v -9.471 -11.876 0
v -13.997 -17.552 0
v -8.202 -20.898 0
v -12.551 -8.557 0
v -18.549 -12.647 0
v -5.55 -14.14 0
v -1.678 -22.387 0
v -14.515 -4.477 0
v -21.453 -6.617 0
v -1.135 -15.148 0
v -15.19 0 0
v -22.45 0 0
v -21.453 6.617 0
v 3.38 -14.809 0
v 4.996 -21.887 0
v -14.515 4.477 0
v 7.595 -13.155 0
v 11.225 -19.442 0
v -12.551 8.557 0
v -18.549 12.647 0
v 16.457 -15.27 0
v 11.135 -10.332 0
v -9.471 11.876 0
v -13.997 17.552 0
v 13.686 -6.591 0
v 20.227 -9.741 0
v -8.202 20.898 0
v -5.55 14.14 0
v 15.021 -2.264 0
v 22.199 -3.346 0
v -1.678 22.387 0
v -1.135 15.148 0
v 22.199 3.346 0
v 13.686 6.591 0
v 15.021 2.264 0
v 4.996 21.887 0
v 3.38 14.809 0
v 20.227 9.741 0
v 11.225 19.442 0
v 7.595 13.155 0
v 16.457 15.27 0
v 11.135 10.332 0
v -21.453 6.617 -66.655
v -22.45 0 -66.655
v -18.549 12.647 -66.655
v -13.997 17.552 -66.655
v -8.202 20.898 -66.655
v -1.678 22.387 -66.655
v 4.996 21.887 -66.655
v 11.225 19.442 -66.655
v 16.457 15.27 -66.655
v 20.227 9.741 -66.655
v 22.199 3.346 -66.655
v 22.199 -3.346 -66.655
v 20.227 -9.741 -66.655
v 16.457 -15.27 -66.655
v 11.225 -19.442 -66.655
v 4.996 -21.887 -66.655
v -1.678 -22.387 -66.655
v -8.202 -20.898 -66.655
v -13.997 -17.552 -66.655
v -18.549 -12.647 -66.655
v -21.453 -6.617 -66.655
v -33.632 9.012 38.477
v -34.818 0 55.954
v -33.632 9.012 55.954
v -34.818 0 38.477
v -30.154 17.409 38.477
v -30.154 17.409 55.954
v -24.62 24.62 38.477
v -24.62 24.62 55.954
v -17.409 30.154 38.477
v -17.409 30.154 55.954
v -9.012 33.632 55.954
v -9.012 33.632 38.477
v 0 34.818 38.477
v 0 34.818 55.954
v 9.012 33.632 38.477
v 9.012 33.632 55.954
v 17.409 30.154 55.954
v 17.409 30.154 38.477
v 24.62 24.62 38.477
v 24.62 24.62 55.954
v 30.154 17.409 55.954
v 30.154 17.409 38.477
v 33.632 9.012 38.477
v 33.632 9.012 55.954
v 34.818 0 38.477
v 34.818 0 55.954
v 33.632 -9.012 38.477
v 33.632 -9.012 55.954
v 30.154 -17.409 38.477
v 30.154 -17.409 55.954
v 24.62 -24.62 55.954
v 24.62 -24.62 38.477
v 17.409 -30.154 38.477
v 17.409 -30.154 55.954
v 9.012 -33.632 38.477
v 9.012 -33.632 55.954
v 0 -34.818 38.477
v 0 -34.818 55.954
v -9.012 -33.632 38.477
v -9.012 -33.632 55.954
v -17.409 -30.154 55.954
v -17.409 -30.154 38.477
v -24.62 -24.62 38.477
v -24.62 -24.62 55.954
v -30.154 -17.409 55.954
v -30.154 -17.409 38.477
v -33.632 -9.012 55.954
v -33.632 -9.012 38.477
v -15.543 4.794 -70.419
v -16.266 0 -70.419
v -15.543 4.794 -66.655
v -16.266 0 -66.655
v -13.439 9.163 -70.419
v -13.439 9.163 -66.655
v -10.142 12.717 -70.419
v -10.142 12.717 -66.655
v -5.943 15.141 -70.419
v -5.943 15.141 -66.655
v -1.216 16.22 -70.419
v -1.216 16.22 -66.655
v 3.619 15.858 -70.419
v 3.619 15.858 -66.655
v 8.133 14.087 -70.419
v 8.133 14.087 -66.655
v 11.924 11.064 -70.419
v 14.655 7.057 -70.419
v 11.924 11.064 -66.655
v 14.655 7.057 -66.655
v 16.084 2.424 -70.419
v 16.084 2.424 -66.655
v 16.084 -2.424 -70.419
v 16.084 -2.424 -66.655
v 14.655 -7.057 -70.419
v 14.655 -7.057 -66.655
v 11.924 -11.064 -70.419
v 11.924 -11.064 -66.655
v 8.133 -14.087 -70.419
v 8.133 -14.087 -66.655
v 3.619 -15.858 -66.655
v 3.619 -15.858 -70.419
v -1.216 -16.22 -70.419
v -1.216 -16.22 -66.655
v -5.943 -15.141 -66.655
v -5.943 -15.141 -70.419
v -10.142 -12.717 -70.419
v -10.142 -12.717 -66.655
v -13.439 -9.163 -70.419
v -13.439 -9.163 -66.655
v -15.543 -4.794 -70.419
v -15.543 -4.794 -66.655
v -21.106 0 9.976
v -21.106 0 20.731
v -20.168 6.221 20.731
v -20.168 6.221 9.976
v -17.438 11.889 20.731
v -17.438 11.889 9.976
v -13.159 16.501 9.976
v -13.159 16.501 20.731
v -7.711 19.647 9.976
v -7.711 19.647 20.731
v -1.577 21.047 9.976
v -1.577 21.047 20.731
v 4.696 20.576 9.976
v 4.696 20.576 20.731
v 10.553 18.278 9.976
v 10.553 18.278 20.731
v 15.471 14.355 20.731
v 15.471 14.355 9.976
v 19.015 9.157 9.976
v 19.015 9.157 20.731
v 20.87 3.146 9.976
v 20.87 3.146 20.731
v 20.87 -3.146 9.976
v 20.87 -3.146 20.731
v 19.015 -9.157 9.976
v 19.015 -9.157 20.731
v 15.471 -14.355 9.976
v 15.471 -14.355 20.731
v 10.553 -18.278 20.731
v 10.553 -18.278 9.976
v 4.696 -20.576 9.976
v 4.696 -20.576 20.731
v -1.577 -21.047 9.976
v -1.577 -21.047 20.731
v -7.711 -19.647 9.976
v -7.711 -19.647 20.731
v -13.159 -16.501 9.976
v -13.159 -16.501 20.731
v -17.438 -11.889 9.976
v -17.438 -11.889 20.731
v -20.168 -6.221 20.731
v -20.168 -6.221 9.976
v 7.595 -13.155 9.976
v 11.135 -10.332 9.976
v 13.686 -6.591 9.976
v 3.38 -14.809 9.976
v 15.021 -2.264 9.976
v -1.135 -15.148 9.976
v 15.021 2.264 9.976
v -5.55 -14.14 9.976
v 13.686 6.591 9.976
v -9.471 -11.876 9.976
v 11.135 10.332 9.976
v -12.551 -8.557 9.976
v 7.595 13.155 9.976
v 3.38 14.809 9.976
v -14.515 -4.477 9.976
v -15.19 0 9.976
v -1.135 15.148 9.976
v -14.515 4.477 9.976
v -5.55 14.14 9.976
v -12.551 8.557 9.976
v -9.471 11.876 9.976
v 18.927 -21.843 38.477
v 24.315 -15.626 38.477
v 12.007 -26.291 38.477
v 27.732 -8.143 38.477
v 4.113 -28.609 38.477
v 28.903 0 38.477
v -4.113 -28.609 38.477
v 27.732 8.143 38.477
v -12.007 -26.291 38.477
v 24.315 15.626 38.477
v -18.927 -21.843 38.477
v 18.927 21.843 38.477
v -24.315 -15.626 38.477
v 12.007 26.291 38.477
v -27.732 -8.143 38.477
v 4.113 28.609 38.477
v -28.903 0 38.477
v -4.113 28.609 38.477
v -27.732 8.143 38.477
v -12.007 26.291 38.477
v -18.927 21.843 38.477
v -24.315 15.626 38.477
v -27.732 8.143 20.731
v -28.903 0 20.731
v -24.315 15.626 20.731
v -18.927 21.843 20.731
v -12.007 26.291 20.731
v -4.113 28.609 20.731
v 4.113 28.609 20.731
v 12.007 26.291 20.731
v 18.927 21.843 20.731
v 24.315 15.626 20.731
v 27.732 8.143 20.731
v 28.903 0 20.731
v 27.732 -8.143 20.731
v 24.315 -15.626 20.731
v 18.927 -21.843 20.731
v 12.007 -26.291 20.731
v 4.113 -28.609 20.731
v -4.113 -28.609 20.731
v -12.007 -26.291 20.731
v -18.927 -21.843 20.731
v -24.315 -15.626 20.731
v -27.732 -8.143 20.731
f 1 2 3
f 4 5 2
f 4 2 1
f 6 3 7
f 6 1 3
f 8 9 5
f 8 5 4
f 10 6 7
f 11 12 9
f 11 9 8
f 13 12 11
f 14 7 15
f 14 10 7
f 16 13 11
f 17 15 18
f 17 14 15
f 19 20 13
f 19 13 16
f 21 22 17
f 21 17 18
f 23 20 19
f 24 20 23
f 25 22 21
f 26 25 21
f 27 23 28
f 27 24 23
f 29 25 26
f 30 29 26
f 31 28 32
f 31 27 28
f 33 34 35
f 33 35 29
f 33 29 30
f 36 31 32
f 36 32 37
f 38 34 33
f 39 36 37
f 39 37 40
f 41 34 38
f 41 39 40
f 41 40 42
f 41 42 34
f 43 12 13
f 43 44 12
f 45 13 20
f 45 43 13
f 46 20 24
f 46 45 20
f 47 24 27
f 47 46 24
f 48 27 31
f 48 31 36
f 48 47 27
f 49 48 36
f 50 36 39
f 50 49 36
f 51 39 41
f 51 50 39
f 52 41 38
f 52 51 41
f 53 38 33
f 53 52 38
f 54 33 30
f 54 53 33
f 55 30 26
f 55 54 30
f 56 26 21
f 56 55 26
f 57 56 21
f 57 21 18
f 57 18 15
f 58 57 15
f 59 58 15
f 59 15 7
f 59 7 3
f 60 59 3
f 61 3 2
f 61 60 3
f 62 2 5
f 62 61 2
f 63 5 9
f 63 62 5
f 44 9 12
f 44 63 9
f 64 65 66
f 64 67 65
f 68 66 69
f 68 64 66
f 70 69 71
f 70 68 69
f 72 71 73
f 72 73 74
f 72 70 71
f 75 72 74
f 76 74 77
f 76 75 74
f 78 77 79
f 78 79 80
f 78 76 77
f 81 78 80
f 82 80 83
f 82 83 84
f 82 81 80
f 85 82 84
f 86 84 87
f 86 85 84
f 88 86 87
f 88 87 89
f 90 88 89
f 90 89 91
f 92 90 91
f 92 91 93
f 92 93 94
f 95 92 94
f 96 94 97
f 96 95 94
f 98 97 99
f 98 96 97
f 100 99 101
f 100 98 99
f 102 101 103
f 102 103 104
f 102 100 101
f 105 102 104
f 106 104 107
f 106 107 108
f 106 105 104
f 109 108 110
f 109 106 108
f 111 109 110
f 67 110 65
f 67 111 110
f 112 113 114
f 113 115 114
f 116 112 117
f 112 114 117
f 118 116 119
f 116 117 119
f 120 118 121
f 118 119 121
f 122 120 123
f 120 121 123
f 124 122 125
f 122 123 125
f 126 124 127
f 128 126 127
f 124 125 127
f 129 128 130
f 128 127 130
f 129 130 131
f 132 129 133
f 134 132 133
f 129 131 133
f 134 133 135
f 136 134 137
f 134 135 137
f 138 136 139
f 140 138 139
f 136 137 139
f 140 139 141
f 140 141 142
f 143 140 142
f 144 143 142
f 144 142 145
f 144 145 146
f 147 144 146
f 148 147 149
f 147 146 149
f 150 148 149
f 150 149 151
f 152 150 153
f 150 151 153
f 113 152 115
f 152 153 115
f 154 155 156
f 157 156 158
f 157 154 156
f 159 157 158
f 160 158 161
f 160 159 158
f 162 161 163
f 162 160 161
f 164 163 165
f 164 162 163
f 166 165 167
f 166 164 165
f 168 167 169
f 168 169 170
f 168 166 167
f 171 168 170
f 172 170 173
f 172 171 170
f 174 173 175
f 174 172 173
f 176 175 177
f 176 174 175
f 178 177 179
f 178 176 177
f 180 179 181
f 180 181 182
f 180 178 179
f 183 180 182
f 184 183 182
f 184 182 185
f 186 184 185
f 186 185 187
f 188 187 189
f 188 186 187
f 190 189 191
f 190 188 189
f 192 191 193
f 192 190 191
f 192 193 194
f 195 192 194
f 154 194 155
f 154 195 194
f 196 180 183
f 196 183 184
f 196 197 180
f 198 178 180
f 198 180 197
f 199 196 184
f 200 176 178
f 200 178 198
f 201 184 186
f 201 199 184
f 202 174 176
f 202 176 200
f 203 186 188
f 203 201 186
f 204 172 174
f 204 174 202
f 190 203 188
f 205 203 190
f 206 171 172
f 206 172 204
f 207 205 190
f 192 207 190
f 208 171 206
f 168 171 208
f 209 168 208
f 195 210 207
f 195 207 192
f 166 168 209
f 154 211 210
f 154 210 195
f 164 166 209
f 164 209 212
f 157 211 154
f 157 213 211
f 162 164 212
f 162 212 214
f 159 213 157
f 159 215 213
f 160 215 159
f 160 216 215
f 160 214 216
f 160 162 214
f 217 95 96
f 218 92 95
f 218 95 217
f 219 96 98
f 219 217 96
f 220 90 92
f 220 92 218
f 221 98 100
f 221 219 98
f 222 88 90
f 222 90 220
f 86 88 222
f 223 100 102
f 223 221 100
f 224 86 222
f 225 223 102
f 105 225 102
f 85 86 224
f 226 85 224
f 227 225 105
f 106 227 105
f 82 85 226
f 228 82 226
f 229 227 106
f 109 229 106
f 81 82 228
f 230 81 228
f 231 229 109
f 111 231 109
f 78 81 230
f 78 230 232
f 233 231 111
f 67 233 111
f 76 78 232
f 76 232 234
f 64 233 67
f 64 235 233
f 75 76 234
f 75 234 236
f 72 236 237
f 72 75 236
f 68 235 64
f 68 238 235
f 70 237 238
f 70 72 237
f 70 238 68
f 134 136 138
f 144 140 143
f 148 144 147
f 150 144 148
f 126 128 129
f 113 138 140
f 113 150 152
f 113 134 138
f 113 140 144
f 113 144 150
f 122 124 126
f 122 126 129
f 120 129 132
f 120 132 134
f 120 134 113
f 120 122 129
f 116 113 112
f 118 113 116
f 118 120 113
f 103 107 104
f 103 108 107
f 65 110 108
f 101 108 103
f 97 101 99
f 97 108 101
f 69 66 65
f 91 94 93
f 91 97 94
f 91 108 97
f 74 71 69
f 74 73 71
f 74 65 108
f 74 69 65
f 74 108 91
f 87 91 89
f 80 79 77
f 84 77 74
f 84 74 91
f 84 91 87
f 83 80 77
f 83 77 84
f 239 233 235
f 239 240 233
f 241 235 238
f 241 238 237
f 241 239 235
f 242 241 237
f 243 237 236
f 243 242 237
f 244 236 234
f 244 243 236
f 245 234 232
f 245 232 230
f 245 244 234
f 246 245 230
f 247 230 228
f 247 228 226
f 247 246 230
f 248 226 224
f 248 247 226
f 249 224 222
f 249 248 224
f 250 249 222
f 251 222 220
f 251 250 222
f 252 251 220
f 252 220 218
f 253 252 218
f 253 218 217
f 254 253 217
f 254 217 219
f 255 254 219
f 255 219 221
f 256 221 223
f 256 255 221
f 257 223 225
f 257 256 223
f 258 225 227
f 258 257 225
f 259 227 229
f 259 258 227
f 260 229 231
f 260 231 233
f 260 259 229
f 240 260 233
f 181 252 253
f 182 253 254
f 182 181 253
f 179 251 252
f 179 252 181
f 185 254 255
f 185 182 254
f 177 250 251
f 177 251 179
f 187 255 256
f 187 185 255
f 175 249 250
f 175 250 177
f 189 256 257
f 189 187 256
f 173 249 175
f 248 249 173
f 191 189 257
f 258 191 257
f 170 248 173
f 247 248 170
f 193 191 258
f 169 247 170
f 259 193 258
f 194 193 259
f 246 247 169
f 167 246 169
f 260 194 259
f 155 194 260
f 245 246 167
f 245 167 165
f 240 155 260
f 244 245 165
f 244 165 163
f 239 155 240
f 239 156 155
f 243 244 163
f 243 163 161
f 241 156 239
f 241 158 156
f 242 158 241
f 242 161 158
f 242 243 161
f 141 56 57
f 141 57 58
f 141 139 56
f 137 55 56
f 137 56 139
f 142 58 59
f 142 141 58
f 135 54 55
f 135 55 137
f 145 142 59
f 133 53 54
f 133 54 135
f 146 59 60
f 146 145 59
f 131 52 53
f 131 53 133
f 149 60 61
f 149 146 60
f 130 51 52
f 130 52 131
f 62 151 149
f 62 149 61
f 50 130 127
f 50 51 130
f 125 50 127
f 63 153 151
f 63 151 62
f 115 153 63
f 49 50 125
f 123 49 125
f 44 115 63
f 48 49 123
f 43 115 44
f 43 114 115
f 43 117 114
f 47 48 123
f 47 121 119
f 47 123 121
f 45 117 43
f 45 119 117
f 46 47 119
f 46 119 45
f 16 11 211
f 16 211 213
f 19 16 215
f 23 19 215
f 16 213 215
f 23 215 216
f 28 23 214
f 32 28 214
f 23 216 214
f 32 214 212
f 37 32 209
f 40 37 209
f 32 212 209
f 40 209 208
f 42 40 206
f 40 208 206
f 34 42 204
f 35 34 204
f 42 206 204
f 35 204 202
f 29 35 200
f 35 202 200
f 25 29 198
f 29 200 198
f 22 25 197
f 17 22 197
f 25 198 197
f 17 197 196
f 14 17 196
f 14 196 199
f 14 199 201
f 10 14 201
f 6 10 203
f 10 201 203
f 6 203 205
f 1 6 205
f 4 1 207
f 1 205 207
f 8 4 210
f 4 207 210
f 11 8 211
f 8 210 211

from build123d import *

# Parameters (mm, degrees)
F0_W   = 16.2657573819
F0_H   = 3.7642940879
F0_W_2 = 15.1902455837
F0_H_2 = 9.9756410345


with BuildPart() as f1:
    # F0 (on Front) → F1 (revolve)
    with BuildSketch(Plane.XZ):
        Polygon((0, 38.4767018259), (0, 55.9537671506), (-34.8183326423, 55.9537671506), (-34.8183326423, 38.4767018259), (-28.9030186832, 38.4767018259), align=None)
        Polygon((0, 20.7307580858), (0, 38.4767018259), (-28.9030186832, 38.4767018259), (-28.9030186832, 20.7307580858), (-21.1055595428, 20.7307580858), align=None)
        with Locations((-8.132878691, -68.5367174447)):
            Rectangle(F0_W, F0_H)
        Polygon((0, -66.6545704007), (0, 0), (-15.1902455837, 0), (-22.4499497563, 0), (-22.4499497563, -66.6545704007), (-16.2657573819, -66.6545704007), align=None)
        with Locations((-7.5951227918, 4.9878205173)):
            Rectangle(F0_W_2, F0_H_2)
        Polygon((0, 9.9756410345), (0, 20.7307580858), (-21.1055595428, 20.7307580858), (-21.1055595428, 9.9756410345), (-15.1902455837, 9.9756410345), align=None)
    revolve(axis=Axis((0, 0, -74.1831511259), (0, 0, -1)))


solid = f1.part
